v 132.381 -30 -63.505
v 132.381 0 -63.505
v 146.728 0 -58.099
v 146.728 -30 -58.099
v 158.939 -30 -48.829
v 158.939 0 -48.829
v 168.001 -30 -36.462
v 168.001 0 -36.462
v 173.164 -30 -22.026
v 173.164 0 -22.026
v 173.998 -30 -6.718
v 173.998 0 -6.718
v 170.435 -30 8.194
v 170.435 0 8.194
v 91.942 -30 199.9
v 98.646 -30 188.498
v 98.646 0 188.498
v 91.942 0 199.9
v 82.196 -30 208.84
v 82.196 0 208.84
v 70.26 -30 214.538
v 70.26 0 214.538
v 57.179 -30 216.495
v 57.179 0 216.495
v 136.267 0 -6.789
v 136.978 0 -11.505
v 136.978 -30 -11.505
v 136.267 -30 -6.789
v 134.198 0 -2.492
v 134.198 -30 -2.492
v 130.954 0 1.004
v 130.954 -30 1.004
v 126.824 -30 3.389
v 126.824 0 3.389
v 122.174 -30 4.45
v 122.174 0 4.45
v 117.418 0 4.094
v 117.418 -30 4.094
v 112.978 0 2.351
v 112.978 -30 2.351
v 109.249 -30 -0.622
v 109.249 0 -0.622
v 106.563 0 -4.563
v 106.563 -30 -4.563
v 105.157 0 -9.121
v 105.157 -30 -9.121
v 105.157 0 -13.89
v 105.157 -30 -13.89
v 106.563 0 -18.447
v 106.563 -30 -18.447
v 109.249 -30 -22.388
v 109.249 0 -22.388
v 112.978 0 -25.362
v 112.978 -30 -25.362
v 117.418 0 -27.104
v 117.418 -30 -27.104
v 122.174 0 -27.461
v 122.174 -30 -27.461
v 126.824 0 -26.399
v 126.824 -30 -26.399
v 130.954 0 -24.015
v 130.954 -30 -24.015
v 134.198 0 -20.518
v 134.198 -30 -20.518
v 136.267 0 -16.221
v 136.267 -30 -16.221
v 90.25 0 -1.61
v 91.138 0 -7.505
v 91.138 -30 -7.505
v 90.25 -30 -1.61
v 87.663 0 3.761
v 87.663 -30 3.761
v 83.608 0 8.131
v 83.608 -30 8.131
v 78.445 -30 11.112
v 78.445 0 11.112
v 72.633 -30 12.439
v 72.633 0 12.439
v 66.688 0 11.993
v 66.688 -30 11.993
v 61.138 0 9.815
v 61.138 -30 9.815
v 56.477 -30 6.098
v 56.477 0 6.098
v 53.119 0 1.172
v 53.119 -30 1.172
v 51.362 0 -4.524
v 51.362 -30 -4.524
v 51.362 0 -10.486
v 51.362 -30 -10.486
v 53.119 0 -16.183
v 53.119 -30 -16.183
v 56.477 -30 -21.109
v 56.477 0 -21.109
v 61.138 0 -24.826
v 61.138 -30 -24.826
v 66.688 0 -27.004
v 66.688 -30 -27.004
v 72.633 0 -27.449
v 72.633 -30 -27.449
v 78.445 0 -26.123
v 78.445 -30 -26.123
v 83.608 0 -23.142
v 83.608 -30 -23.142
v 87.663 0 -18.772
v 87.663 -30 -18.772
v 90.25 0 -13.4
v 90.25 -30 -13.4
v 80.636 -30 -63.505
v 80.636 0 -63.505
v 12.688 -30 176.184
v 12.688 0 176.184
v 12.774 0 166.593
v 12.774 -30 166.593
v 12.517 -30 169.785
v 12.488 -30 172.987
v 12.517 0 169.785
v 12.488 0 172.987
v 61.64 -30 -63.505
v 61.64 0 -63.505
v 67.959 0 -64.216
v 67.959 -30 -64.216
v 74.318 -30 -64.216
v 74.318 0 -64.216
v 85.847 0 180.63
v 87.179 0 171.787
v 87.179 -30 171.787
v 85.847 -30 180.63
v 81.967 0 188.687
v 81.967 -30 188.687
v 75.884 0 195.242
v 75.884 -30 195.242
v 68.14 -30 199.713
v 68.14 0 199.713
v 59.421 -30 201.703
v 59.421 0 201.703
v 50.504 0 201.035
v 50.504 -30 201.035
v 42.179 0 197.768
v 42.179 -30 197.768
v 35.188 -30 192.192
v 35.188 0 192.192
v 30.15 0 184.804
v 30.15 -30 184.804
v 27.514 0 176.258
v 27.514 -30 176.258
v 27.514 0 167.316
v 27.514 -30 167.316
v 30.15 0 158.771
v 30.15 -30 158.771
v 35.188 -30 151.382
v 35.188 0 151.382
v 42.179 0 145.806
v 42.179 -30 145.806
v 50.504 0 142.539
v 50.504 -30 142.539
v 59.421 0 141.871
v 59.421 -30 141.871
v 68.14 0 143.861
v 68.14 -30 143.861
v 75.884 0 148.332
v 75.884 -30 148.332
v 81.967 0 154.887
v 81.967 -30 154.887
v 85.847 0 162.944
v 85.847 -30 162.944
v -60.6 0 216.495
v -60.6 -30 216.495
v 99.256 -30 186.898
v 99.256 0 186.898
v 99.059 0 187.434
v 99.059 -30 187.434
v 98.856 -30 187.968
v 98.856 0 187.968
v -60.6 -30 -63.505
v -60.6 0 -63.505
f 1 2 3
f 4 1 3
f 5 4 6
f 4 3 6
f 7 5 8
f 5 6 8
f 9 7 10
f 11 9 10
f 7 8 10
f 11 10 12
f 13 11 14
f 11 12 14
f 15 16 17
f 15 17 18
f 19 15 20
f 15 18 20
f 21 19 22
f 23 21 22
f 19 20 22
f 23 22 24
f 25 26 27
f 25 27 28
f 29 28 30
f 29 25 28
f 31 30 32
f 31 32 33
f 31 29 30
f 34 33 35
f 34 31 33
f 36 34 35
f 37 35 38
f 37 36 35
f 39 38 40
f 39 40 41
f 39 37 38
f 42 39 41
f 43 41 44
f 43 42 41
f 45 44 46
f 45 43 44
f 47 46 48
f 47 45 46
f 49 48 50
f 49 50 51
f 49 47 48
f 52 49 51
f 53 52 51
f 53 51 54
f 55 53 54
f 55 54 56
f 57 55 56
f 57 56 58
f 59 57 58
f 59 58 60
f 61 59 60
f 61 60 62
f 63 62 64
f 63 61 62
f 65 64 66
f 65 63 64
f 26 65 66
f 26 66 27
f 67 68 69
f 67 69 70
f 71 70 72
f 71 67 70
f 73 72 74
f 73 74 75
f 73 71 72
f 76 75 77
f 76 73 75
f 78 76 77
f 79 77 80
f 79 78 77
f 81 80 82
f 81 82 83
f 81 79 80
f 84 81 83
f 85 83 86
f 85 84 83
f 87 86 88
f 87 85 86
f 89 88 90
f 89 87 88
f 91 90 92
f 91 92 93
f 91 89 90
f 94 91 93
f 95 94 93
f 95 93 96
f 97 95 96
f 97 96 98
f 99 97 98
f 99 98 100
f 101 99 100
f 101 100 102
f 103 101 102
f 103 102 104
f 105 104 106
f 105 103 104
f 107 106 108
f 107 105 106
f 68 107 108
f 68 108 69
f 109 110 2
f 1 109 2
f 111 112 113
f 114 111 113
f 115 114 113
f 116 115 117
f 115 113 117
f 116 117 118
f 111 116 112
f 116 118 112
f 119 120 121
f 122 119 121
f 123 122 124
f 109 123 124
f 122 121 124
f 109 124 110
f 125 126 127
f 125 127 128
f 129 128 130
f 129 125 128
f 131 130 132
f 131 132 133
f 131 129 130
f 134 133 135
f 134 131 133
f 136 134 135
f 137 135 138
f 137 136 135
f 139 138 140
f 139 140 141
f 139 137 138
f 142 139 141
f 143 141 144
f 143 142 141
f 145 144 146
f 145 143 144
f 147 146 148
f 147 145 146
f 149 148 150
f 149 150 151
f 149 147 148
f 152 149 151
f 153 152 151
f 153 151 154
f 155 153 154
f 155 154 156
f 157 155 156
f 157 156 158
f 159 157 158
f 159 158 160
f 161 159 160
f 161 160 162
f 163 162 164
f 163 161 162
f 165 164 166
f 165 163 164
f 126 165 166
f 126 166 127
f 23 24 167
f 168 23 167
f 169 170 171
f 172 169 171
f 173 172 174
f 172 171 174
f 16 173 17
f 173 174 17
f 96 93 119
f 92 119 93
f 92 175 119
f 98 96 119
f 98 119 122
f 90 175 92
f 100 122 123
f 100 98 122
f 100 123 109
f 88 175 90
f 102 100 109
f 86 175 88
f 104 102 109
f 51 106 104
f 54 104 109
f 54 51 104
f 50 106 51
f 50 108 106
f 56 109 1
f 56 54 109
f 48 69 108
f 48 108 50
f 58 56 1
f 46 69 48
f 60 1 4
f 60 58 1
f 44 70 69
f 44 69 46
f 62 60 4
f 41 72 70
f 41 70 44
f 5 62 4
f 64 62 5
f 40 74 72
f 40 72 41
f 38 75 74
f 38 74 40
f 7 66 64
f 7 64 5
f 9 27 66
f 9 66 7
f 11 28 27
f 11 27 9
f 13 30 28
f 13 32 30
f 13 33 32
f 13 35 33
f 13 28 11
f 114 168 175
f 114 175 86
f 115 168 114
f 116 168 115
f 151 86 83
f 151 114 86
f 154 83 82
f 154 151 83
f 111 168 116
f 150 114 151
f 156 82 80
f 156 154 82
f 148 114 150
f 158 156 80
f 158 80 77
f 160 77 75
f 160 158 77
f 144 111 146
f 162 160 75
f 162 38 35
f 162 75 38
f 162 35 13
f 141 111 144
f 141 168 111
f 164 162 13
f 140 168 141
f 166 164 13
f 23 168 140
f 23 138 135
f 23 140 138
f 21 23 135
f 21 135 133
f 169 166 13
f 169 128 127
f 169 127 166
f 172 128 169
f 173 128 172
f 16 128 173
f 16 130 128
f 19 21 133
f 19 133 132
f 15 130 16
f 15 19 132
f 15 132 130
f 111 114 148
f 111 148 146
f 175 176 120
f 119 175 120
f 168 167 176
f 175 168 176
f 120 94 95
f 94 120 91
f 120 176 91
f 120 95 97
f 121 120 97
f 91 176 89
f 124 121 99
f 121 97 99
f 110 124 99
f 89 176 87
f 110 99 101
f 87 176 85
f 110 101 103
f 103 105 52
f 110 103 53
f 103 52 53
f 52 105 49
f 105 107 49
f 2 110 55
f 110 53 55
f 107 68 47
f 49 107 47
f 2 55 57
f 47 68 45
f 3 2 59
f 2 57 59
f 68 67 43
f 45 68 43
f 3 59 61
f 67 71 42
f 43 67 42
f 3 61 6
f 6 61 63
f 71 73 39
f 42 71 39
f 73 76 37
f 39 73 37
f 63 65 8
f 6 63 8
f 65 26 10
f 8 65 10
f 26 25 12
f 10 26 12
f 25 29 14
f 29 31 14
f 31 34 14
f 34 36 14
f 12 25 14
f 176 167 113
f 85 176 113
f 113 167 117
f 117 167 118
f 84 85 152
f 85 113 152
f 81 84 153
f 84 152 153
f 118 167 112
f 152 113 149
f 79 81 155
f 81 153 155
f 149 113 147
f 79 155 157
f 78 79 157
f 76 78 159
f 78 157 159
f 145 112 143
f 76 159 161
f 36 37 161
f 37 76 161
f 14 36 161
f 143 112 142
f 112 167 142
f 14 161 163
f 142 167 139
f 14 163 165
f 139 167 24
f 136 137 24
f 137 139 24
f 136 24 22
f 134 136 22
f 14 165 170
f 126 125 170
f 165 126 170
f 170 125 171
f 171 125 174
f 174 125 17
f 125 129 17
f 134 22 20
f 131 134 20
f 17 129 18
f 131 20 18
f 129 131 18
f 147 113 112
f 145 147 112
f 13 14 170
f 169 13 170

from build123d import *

# Parameters (mm, degrees)
F0_R     = 20
F0_R_2   = 16
F0_R_3   = 30
F1_DEPTH = 30


with BuildPart() as f1:
    # F0 (on Front) → F1 (new body)
    with BuildSketch(Plane.XZ):
        with BuildLine():
            Line((57.179358, 216.494742), (-60.600481, 216.494742))
            Line((-60.600481, 216.494742), (-60.600481, -63.505258))
            Line((-60.600481, -63.505258), (7.520599, -63.505258))
            Line((7.520599, -63.505258), (58.176437, -63.505258))
            Line((58.176437, -63.505258), (61.640235, -63.505258))
            ThreePointArc((61.640235, -63.505258), (27.911346, -44.351415), (14.340876, -8.014795))
            Line((14.340876, -8.014795), (12.77445, 166.592886))
            ThreePointArc((12.77445, 166.592886), (12.473491, 171.386014), (12.68841, 176.18377))
            ThreePointArc((12.68841, 176.18377), (27.160951, 204.918189), (57.179358, 216.494742))
        make_face()
        with BuildLine():
            ThreePointArc((98.646262, 188.498488), (82.195824, 208.840441), (57.179358, 216.494742))
            ThreePointArc((57.179358, 216.494742), (27.160951, 204.918189), (12.68841, 176.18377))
            Line((12.68841, 176.18377), (12.77445, 166.592886))
            Line((12.77445, 166.592886), (14.340876, -8.014795))
            ThreePointArc((14.340876, -8.014795), (27.911346, -44.351415), (61.640235, -63.505258))
            Line((61.640235, -63.505258), (80.636496, -63.505258))
            Line((80.636496, -63.505258), (132.381109, -63.505258))
            ThreePointArc((132.381109, -63.505258), (168.001141, -36.462478), (170.434949, 8.193711))
            Line((170.434949, 8.193711), (99.25581, 186.898251))
            Line((99.25581, 186.898251), (98.646262, 188.498488))
        make_face()
        with Locations((71.138366, -7.505258)):
            Circle(F0_R, mode=Mode.SUBTRACT)
        with Locations((120.978109, -11.505258)):
            Circle(F0_R_2, mode=Mode.SUBTRACT)
        with Locations((57.179358, 171.787076)):
            Circle(F0_R_3, mode=Mode.SUBTRACT)
        with BuildLine():
            ThreePointArc((99.25581, 186.898251), (98.958698, 187.701288), (98.646262, 188.498488))
            Line((98.646262, 188.498488), (99.25581, 186.898251))
        make_face()
        with BuildLine():
            Line((80.636496, -63.505258), (61.640235, -63.505258))
            ThreePointArc((61.640235, -63.505258), (71.138366, -64.305033), (80.636496, -63.505258))
        make_face()
    extrude(amount=F1_DEPTH)


solid = f1.part
